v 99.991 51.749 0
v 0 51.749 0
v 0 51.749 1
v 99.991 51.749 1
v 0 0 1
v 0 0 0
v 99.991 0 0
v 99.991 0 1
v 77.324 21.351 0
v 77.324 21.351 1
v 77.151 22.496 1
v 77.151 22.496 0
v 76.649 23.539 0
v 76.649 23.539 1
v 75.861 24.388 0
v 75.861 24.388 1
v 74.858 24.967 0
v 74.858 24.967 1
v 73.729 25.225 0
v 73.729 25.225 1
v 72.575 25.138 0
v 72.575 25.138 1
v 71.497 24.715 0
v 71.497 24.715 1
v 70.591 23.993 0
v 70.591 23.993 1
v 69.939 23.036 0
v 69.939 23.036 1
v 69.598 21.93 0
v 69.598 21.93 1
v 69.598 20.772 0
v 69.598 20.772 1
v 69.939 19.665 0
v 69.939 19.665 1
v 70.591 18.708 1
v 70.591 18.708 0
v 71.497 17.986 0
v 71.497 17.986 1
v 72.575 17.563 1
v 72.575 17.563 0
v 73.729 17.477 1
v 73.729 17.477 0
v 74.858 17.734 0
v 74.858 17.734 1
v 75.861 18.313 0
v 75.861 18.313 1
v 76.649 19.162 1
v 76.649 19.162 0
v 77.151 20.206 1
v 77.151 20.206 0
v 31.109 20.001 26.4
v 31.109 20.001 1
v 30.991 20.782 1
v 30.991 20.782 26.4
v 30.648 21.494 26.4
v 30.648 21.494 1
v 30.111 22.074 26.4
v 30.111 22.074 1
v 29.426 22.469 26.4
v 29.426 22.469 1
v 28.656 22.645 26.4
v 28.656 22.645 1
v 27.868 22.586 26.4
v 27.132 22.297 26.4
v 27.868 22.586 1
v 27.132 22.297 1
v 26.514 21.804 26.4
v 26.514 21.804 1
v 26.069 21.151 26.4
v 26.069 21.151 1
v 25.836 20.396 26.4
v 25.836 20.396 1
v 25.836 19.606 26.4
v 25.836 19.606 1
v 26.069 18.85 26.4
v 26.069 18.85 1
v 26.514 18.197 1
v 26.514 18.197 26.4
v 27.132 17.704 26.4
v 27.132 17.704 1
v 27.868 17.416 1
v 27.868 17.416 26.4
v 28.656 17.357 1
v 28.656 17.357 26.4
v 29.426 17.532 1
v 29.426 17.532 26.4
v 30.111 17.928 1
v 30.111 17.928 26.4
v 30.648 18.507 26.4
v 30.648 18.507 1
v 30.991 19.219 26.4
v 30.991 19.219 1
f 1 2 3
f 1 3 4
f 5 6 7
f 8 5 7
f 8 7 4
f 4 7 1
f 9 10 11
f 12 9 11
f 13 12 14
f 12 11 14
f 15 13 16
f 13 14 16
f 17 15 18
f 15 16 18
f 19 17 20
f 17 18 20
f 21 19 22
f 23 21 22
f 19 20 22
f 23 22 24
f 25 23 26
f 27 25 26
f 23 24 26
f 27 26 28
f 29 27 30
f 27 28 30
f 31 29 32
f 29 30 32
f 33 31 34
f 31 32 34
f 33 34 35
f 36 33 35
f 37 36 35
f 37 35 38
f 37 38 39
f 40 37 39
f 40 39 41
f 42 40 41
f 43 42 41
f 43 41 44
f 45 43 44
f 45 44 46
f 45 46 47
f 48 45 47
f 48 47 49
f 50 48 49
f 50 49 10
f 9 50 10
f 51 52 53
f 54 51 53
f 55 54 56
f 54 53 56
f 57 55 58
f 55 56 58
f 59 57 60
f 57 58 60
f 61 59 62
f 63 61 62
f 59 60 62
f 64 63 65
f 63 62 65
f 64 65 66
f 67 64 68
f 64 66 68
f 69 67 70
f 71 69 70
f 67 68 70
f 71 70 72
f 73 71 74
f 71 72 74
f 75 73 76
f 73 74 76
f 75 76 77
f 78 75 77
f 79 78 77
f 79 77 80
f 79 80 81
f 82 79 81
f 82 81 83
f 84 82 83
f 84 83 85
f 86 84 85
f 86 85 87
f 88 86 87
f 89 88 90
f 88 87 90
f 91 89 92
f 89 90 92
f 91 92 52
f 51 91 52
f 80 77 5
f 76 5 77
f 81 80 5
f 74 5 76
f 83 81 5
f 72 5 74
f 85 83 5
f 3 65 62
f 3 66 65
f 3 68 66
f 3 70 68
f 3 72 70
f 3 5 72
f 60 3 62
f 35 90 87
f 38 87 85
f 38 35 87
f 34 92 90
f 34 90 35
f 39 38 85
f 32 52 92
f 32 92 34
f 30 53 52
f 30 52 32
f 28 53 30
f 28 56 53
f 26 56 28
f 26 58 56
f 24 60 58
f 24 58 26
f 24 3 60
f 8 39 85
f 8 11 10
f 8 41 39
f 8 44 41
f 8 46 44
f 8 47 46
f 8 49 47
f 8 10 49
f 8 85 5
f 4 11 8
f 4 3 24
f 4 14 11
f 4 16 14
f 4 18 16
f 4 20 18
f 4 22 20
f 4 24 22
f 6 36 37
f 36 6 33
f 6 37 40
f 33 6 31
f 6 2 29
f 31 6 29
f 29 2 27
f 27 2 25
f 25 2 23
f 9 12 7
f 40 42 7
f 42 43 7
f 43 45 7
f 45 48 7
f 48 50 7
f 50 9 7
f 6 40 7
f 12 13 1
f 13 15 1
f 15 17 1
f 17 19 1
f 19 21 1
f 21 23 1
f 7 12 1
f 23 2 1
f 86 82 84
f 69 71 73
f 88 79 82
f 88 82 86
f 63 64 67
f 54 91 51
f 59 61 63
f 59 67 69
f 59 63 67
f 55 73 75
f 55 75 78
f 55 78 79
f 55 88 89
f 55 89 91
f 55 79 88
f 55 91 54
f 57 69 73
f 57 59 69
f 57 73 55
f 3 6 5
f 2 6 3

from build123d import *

# Parameters (mm, degrees)
F0_W     = 99.991299
F0_H     = 51.749203
F1_DEPTH = 1
F2_R     = 3.884772
F3_DEPTH = 1.001
F4_R     = 2.651648
F5_DEPTH = 25.4


with BuildPart() as f1:
    # F0 (on Top) → F1 (new body)
    with BuildSketch(Plane.XY):
        with Locations((49.995649, 25.874601)):
            Rectangle(F0_W, F0_H)
    extrude(amount=F1_DEPTH)

    # F2 (on face) → F3 (cut, through all)
    with BuildSketch(Plane.XY.offset(1)):
        with Locations((73.43898, 21.35068)):
            Circle(F2_R)
    extrude(amount=-F3_DEPTH, mode=Mode.SUBTRACT)

    # F4 (on face) → F5 (join)
    with BuildSketch(Plane.XY.offset(1)):
        with Locations((28.457584, 20.000773)):
            Circle(F4_R)
    extrude(amount=F5_DEPTH)


solid = f1.part
